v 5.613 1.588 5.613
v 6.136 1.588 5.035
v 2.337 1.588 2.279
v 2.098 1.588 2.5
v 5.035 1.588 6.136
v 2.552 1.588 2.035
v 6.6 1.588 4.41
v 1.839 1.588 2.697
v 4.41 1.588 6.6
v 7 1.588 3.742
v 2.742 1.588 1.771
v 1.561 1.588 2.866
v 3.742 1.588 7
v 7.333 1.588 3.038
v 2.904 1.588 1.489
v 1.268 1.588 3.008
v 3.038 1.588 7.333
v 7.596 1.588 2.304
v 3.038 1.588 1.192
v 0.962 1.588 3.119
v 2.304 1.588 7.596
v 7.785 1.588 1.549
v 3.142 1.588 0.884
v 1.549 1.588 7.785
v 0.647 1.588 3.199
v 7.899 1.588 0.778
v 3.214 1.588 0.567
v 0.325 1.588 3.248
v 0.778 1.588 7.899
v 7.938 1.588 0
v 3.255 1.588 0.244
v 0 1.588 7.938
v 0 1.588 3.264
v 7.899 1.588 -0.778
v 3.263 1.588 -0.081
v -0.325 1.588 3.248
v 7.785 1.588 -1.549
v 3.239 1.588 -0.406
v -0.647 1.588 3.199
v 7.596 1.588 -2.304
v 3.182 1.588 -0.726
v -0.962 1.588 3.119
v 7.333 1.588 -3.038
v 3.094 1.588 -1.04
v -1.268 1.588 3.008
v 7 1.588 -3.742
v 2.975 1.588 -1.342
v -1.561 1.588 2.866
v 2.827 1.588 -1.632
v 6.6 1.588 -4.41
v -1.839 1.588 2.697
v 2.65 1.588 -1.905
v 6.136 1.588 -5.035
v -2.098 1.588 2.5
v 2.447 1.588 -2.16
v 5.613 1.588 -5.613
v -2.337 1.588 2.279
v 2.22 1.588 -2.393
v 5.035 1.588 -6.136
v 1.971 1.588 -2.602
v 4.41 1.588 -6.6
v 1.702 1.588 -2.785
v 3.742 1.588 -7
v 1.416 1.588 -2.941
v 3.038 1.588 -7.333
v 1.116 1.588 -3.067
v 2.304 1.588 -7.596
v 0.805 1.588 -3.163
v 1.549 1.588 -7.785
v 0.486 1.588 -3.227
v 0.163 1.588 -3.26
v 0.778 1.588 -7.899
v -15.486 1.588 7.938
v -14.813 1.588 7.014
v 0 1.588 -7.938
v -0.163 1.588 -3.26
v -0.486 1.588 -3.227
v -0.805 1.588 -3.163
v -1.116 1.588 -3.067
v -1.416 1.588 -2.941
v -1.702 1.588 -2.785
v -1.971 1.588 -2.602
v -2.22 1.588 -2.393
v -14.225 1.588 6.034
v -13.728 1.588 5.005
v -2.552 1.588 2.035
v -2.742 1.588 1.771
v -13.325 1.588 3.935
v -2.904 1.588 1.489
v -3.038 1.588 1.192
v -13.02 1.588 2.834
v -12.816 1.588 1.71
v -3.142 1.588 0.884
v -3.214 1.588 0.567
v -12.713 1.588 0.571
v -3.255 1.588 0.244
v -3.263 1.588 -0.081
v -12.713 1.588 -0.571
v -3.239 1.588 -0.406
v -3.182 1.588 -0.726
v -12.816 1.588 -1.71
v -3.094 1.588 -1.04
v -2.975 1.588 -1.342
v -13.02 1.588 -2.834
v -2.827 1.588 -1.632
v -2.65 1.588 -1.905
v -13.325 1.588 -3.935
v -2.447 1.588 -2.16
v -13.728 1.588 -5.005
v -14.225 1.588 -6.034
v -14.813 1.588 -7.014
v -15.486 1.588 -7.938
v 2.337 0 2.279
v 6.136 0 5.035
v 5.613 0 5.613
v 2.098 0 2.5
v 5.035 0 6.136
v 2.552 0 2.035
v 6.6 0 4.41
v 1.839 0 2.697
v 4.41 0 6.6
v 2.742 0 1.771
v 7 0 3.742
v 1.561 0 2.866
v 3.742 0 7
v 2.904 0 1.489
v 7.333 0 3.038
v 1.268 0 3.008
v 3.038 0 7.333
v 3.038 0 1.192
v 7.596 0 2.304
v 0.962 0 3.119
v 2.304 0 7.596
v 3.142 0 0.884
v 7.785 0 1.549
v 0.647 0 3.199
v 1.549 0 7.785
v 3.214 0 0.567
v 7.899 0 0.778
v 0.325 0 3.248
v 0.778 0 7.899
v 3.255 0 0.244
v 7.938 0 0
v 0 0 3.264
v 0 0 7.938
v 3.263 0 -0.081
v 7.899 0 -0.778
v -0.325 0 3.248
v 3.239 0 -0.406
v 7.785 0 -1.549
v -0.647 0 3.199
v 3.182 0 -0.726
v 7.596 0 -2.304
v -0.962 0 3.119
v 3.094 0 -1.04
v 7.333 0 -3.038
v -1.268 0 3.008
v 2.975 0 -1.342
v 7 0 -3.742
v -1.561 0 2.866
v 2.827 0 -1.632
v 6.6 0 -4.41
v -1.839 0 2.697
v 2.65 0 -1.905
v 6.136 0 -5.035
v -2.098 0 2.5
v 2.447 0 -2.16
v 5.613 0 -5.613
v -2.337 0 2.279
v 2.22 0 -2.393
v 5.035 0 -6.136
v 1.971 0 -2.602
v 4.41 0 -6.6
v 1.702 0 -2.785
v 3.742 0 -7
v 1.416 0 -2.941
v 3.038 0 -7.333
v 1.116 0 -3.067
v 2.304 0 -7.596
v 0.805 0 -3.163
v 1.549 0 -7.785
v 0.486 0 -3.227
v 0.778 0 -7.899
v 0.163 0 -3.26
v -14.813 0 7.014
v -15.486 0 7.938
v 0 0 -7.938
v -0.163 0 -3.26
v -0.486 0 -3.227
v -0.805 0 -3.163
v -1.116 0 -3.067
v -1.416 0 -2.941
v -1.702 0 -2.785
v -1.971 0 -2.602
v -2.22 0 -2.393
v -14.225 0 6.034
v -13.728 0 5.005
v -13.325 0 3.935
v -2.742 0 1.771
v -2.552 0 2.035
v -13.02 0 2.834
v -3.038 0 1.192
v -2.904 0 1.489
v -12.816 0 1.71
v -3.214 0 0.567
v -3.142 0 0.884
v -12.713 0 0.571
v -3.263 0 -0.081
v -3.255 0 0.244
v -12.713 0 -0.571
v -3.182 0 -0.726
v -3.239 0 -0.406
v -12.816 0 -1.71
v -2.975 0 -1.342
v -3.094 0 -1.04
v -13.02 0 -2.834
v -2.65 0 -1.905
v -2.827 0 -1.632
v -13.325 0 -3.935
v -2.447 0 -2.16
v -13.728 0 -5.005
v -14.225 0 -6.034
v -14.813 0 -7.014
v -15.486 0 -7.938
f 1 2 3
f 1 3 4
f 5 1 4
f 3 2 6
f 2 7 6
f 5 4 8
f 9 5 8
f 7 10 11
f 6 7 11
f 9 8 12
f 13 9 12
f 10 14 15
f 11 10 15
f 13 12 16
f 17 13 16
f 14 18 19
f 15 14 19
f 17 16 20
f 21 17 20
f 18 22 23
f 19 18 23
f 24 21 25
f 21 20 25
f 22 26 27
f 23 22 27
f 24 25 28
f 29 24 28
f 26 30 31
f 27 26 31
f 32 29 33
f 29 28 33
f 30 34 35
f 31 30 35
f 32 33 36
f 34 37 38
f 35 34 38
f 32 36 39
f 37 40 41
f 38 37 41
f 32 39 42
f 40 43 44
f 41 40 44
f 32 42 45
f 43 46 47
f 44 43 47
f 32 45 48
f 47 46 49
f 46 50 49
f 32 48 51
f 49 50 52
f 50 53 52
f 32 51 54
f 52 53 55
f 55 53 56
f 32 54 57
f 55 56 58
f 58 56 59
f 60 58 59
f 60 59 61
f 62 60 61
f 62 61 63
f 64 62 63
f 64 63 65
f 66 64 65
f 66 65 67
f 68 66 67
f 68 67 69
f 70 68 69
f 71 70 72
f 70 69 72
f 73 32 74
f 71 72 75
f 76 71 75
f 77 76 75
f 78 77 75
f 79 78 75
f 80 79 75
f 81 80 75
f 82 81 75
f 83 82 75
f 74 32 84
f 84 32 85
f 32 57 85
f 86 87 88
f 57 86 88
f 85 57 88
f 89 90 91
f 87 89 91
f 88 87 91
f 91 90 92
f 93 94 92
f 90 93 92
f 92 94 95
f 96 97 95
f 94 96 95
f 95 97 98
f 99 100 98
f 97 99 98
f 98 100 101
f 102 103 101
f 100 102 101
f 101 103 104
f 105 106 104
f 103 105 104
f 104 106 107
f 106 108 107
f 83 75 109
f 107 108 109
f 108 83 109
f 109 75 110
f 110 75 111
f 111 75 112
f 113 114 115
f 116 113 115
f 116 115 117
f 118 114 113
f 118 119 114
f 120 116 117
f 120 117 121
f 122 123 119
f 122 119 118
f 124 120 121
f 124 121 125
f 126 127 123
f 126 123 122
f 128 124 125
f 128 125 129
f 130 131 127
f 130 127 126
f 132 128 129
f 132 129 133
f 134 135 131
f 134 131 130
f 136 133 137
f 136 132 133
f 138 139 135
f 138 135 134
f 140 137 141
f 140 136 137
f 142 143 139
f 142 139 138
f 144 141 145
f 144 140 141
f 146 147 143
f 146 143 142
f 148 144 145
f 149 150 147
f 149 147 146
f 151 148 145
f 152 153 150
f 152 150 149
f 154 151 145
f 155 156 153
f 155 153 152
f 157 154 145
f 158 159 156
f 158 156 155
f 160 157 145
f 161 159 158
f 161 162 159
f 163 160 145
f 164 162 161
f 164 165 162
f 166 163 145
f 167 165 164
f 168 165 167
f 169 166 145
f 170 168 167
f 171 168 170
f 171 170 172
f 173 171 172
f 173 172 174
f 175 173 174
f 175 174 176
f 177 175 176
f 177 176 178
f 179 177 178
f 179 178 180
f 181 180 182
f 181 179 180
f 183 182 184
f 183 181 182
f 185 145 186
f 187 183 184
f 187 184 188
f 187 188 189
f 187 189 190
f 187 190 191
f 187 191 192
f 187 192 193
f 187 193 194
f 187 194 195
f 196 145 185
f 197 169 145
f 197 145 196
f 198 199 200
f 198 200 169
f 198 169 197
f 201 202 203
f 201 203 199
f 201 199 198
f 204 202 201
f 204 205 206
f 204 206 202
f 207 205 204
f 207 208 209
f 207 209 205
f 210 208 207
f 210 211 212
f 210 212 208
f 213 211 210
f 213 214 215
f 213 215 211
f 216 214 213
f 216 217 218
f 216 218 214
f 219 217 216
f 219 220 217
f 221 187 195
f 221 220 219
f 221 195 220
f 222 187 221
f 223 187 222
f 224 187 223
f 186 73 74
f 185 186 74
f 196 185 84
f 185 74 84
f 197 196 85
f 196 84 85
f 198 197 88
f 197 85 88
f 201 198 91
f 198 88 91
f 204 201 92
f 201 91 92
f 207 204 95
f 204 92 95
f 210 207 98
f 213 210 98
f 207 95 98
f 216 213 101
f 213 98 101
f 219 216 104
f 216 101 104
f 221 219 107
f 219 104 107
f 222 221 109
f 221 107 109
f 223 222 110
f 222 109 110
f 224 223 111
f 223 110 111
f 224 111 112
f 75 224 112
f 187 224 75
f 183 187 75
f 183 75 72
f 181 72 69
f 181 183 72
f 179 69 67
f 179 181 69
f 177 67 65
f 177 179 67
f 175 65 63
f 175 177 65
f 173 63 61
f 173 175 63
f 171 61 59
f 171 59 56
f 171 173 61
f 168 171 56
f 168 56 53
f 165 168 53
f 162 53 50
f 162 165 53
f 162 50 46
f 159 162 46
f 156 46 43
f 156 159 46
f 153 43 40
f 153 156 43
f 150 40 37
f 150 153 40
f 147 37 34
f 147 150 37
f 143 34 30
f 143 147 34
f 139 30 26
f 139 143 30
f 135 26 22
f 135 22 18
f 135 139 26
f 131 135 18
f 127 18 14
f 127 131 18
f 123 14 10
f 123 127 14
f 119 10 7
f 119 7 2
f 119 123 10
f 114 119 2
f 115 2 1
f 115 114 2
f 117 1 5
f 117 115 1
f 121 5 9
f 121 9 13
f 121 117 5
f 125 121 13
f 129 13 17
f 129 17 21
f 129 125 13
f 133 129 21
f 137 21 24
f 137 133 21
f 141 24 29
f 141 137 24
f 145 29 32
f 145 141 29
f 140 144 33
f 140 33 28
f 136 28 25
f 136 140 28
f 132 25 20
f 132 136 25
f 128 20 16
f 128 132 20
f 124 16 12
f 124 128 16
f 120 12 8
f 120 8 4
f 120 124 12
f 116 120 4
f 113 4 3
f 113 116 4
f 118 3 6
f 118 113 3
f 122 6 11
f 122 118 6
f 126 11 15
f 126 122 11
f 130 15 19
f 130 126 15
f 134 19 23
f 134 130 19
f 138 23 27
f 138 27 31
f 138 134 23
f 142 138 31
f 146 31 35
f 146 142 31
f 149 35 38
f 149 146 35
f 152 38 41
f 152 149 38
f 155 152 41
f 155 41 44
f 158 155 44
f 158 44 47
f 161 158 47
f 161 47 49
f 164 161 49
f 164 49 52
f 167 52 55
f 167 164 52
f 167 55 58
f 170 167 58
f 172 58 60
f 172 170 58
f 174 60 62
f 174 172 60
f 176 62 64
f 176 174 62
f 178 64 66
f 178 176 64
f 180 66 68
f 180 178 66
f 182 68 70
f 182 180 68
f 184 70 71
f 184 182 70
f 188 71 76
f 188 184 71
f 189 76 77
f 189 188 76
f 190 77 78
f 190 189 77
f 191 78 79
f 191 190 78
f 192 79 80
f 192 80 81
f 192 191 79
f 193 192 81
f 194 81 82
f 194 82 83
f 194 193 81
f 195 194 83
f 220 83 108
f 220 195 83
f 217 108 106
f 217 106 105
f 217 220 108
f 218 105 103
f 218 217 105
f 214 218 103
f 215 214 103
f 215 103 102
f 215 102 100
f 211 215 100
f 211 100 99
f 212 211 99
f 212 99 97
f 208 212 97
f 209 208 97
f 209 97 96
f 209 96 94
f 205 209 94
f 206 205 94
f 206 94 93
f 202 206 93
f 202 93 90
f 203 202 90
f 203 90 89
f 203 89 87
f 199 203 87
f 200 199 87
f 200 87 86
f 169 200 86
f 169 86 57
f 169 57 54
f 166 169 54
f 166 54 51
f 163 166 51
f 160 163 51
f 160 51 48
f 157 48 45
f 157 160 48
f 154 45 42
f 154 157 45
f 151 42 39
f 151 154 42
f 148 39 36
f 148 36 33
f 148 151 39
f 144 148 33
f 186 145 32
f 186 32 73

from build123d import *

# Parameters (mm, degrees)
SKETCH1_R           = 3.2639
BOSS_EXTRUDE1_DEPTH = 1.5875
SKETCH2_R           = 12.7
CUT_EXTRUDE1_DEPTH  = 27.658658303


with BuildPart() as part:
    # Sketch1 → Boss-Extrude1 (new body)
    with BuildSketch(Plane(origin=(0, 0, 0), x_dir=(1, 0, 0), z_dir=(0, 1, 0))):
        with BuildLine():
            Line((-25.4, 7.9375), (0, 7.9375))
            ThreePointArc((0, 7.9375), (7.9375, 0), (0, -7.9375))
            Line((0, -7.9375), (-25.4, -7.9375))
            Line((-25.4, -7.9375), (-25.4, 7.9375))
        make_face()
        with Locations(Location((0, 0, 0), (0, 0, 270))):
            Circle(SKETCH1_R, mode=Mode.SUBTRACT)
    extrude(amount=BOSS_EXTRUDE1_DEPTH)

    # Sketch2 → Cut-Extrude1 (cut, through all)
    with BuildSketch(Plane(origin=(0, 1.5875, 0), x_dir=(1, 0, 0), z_dir=(0, 1, 0))):
        with Locations((-25.4, 0)):
            Circle(SKETCH2_R)
    extrude(amount=-CUT_EXTRUDE1_DEPTH, mode=Mode.SUBTRACT)


solid = part.part
